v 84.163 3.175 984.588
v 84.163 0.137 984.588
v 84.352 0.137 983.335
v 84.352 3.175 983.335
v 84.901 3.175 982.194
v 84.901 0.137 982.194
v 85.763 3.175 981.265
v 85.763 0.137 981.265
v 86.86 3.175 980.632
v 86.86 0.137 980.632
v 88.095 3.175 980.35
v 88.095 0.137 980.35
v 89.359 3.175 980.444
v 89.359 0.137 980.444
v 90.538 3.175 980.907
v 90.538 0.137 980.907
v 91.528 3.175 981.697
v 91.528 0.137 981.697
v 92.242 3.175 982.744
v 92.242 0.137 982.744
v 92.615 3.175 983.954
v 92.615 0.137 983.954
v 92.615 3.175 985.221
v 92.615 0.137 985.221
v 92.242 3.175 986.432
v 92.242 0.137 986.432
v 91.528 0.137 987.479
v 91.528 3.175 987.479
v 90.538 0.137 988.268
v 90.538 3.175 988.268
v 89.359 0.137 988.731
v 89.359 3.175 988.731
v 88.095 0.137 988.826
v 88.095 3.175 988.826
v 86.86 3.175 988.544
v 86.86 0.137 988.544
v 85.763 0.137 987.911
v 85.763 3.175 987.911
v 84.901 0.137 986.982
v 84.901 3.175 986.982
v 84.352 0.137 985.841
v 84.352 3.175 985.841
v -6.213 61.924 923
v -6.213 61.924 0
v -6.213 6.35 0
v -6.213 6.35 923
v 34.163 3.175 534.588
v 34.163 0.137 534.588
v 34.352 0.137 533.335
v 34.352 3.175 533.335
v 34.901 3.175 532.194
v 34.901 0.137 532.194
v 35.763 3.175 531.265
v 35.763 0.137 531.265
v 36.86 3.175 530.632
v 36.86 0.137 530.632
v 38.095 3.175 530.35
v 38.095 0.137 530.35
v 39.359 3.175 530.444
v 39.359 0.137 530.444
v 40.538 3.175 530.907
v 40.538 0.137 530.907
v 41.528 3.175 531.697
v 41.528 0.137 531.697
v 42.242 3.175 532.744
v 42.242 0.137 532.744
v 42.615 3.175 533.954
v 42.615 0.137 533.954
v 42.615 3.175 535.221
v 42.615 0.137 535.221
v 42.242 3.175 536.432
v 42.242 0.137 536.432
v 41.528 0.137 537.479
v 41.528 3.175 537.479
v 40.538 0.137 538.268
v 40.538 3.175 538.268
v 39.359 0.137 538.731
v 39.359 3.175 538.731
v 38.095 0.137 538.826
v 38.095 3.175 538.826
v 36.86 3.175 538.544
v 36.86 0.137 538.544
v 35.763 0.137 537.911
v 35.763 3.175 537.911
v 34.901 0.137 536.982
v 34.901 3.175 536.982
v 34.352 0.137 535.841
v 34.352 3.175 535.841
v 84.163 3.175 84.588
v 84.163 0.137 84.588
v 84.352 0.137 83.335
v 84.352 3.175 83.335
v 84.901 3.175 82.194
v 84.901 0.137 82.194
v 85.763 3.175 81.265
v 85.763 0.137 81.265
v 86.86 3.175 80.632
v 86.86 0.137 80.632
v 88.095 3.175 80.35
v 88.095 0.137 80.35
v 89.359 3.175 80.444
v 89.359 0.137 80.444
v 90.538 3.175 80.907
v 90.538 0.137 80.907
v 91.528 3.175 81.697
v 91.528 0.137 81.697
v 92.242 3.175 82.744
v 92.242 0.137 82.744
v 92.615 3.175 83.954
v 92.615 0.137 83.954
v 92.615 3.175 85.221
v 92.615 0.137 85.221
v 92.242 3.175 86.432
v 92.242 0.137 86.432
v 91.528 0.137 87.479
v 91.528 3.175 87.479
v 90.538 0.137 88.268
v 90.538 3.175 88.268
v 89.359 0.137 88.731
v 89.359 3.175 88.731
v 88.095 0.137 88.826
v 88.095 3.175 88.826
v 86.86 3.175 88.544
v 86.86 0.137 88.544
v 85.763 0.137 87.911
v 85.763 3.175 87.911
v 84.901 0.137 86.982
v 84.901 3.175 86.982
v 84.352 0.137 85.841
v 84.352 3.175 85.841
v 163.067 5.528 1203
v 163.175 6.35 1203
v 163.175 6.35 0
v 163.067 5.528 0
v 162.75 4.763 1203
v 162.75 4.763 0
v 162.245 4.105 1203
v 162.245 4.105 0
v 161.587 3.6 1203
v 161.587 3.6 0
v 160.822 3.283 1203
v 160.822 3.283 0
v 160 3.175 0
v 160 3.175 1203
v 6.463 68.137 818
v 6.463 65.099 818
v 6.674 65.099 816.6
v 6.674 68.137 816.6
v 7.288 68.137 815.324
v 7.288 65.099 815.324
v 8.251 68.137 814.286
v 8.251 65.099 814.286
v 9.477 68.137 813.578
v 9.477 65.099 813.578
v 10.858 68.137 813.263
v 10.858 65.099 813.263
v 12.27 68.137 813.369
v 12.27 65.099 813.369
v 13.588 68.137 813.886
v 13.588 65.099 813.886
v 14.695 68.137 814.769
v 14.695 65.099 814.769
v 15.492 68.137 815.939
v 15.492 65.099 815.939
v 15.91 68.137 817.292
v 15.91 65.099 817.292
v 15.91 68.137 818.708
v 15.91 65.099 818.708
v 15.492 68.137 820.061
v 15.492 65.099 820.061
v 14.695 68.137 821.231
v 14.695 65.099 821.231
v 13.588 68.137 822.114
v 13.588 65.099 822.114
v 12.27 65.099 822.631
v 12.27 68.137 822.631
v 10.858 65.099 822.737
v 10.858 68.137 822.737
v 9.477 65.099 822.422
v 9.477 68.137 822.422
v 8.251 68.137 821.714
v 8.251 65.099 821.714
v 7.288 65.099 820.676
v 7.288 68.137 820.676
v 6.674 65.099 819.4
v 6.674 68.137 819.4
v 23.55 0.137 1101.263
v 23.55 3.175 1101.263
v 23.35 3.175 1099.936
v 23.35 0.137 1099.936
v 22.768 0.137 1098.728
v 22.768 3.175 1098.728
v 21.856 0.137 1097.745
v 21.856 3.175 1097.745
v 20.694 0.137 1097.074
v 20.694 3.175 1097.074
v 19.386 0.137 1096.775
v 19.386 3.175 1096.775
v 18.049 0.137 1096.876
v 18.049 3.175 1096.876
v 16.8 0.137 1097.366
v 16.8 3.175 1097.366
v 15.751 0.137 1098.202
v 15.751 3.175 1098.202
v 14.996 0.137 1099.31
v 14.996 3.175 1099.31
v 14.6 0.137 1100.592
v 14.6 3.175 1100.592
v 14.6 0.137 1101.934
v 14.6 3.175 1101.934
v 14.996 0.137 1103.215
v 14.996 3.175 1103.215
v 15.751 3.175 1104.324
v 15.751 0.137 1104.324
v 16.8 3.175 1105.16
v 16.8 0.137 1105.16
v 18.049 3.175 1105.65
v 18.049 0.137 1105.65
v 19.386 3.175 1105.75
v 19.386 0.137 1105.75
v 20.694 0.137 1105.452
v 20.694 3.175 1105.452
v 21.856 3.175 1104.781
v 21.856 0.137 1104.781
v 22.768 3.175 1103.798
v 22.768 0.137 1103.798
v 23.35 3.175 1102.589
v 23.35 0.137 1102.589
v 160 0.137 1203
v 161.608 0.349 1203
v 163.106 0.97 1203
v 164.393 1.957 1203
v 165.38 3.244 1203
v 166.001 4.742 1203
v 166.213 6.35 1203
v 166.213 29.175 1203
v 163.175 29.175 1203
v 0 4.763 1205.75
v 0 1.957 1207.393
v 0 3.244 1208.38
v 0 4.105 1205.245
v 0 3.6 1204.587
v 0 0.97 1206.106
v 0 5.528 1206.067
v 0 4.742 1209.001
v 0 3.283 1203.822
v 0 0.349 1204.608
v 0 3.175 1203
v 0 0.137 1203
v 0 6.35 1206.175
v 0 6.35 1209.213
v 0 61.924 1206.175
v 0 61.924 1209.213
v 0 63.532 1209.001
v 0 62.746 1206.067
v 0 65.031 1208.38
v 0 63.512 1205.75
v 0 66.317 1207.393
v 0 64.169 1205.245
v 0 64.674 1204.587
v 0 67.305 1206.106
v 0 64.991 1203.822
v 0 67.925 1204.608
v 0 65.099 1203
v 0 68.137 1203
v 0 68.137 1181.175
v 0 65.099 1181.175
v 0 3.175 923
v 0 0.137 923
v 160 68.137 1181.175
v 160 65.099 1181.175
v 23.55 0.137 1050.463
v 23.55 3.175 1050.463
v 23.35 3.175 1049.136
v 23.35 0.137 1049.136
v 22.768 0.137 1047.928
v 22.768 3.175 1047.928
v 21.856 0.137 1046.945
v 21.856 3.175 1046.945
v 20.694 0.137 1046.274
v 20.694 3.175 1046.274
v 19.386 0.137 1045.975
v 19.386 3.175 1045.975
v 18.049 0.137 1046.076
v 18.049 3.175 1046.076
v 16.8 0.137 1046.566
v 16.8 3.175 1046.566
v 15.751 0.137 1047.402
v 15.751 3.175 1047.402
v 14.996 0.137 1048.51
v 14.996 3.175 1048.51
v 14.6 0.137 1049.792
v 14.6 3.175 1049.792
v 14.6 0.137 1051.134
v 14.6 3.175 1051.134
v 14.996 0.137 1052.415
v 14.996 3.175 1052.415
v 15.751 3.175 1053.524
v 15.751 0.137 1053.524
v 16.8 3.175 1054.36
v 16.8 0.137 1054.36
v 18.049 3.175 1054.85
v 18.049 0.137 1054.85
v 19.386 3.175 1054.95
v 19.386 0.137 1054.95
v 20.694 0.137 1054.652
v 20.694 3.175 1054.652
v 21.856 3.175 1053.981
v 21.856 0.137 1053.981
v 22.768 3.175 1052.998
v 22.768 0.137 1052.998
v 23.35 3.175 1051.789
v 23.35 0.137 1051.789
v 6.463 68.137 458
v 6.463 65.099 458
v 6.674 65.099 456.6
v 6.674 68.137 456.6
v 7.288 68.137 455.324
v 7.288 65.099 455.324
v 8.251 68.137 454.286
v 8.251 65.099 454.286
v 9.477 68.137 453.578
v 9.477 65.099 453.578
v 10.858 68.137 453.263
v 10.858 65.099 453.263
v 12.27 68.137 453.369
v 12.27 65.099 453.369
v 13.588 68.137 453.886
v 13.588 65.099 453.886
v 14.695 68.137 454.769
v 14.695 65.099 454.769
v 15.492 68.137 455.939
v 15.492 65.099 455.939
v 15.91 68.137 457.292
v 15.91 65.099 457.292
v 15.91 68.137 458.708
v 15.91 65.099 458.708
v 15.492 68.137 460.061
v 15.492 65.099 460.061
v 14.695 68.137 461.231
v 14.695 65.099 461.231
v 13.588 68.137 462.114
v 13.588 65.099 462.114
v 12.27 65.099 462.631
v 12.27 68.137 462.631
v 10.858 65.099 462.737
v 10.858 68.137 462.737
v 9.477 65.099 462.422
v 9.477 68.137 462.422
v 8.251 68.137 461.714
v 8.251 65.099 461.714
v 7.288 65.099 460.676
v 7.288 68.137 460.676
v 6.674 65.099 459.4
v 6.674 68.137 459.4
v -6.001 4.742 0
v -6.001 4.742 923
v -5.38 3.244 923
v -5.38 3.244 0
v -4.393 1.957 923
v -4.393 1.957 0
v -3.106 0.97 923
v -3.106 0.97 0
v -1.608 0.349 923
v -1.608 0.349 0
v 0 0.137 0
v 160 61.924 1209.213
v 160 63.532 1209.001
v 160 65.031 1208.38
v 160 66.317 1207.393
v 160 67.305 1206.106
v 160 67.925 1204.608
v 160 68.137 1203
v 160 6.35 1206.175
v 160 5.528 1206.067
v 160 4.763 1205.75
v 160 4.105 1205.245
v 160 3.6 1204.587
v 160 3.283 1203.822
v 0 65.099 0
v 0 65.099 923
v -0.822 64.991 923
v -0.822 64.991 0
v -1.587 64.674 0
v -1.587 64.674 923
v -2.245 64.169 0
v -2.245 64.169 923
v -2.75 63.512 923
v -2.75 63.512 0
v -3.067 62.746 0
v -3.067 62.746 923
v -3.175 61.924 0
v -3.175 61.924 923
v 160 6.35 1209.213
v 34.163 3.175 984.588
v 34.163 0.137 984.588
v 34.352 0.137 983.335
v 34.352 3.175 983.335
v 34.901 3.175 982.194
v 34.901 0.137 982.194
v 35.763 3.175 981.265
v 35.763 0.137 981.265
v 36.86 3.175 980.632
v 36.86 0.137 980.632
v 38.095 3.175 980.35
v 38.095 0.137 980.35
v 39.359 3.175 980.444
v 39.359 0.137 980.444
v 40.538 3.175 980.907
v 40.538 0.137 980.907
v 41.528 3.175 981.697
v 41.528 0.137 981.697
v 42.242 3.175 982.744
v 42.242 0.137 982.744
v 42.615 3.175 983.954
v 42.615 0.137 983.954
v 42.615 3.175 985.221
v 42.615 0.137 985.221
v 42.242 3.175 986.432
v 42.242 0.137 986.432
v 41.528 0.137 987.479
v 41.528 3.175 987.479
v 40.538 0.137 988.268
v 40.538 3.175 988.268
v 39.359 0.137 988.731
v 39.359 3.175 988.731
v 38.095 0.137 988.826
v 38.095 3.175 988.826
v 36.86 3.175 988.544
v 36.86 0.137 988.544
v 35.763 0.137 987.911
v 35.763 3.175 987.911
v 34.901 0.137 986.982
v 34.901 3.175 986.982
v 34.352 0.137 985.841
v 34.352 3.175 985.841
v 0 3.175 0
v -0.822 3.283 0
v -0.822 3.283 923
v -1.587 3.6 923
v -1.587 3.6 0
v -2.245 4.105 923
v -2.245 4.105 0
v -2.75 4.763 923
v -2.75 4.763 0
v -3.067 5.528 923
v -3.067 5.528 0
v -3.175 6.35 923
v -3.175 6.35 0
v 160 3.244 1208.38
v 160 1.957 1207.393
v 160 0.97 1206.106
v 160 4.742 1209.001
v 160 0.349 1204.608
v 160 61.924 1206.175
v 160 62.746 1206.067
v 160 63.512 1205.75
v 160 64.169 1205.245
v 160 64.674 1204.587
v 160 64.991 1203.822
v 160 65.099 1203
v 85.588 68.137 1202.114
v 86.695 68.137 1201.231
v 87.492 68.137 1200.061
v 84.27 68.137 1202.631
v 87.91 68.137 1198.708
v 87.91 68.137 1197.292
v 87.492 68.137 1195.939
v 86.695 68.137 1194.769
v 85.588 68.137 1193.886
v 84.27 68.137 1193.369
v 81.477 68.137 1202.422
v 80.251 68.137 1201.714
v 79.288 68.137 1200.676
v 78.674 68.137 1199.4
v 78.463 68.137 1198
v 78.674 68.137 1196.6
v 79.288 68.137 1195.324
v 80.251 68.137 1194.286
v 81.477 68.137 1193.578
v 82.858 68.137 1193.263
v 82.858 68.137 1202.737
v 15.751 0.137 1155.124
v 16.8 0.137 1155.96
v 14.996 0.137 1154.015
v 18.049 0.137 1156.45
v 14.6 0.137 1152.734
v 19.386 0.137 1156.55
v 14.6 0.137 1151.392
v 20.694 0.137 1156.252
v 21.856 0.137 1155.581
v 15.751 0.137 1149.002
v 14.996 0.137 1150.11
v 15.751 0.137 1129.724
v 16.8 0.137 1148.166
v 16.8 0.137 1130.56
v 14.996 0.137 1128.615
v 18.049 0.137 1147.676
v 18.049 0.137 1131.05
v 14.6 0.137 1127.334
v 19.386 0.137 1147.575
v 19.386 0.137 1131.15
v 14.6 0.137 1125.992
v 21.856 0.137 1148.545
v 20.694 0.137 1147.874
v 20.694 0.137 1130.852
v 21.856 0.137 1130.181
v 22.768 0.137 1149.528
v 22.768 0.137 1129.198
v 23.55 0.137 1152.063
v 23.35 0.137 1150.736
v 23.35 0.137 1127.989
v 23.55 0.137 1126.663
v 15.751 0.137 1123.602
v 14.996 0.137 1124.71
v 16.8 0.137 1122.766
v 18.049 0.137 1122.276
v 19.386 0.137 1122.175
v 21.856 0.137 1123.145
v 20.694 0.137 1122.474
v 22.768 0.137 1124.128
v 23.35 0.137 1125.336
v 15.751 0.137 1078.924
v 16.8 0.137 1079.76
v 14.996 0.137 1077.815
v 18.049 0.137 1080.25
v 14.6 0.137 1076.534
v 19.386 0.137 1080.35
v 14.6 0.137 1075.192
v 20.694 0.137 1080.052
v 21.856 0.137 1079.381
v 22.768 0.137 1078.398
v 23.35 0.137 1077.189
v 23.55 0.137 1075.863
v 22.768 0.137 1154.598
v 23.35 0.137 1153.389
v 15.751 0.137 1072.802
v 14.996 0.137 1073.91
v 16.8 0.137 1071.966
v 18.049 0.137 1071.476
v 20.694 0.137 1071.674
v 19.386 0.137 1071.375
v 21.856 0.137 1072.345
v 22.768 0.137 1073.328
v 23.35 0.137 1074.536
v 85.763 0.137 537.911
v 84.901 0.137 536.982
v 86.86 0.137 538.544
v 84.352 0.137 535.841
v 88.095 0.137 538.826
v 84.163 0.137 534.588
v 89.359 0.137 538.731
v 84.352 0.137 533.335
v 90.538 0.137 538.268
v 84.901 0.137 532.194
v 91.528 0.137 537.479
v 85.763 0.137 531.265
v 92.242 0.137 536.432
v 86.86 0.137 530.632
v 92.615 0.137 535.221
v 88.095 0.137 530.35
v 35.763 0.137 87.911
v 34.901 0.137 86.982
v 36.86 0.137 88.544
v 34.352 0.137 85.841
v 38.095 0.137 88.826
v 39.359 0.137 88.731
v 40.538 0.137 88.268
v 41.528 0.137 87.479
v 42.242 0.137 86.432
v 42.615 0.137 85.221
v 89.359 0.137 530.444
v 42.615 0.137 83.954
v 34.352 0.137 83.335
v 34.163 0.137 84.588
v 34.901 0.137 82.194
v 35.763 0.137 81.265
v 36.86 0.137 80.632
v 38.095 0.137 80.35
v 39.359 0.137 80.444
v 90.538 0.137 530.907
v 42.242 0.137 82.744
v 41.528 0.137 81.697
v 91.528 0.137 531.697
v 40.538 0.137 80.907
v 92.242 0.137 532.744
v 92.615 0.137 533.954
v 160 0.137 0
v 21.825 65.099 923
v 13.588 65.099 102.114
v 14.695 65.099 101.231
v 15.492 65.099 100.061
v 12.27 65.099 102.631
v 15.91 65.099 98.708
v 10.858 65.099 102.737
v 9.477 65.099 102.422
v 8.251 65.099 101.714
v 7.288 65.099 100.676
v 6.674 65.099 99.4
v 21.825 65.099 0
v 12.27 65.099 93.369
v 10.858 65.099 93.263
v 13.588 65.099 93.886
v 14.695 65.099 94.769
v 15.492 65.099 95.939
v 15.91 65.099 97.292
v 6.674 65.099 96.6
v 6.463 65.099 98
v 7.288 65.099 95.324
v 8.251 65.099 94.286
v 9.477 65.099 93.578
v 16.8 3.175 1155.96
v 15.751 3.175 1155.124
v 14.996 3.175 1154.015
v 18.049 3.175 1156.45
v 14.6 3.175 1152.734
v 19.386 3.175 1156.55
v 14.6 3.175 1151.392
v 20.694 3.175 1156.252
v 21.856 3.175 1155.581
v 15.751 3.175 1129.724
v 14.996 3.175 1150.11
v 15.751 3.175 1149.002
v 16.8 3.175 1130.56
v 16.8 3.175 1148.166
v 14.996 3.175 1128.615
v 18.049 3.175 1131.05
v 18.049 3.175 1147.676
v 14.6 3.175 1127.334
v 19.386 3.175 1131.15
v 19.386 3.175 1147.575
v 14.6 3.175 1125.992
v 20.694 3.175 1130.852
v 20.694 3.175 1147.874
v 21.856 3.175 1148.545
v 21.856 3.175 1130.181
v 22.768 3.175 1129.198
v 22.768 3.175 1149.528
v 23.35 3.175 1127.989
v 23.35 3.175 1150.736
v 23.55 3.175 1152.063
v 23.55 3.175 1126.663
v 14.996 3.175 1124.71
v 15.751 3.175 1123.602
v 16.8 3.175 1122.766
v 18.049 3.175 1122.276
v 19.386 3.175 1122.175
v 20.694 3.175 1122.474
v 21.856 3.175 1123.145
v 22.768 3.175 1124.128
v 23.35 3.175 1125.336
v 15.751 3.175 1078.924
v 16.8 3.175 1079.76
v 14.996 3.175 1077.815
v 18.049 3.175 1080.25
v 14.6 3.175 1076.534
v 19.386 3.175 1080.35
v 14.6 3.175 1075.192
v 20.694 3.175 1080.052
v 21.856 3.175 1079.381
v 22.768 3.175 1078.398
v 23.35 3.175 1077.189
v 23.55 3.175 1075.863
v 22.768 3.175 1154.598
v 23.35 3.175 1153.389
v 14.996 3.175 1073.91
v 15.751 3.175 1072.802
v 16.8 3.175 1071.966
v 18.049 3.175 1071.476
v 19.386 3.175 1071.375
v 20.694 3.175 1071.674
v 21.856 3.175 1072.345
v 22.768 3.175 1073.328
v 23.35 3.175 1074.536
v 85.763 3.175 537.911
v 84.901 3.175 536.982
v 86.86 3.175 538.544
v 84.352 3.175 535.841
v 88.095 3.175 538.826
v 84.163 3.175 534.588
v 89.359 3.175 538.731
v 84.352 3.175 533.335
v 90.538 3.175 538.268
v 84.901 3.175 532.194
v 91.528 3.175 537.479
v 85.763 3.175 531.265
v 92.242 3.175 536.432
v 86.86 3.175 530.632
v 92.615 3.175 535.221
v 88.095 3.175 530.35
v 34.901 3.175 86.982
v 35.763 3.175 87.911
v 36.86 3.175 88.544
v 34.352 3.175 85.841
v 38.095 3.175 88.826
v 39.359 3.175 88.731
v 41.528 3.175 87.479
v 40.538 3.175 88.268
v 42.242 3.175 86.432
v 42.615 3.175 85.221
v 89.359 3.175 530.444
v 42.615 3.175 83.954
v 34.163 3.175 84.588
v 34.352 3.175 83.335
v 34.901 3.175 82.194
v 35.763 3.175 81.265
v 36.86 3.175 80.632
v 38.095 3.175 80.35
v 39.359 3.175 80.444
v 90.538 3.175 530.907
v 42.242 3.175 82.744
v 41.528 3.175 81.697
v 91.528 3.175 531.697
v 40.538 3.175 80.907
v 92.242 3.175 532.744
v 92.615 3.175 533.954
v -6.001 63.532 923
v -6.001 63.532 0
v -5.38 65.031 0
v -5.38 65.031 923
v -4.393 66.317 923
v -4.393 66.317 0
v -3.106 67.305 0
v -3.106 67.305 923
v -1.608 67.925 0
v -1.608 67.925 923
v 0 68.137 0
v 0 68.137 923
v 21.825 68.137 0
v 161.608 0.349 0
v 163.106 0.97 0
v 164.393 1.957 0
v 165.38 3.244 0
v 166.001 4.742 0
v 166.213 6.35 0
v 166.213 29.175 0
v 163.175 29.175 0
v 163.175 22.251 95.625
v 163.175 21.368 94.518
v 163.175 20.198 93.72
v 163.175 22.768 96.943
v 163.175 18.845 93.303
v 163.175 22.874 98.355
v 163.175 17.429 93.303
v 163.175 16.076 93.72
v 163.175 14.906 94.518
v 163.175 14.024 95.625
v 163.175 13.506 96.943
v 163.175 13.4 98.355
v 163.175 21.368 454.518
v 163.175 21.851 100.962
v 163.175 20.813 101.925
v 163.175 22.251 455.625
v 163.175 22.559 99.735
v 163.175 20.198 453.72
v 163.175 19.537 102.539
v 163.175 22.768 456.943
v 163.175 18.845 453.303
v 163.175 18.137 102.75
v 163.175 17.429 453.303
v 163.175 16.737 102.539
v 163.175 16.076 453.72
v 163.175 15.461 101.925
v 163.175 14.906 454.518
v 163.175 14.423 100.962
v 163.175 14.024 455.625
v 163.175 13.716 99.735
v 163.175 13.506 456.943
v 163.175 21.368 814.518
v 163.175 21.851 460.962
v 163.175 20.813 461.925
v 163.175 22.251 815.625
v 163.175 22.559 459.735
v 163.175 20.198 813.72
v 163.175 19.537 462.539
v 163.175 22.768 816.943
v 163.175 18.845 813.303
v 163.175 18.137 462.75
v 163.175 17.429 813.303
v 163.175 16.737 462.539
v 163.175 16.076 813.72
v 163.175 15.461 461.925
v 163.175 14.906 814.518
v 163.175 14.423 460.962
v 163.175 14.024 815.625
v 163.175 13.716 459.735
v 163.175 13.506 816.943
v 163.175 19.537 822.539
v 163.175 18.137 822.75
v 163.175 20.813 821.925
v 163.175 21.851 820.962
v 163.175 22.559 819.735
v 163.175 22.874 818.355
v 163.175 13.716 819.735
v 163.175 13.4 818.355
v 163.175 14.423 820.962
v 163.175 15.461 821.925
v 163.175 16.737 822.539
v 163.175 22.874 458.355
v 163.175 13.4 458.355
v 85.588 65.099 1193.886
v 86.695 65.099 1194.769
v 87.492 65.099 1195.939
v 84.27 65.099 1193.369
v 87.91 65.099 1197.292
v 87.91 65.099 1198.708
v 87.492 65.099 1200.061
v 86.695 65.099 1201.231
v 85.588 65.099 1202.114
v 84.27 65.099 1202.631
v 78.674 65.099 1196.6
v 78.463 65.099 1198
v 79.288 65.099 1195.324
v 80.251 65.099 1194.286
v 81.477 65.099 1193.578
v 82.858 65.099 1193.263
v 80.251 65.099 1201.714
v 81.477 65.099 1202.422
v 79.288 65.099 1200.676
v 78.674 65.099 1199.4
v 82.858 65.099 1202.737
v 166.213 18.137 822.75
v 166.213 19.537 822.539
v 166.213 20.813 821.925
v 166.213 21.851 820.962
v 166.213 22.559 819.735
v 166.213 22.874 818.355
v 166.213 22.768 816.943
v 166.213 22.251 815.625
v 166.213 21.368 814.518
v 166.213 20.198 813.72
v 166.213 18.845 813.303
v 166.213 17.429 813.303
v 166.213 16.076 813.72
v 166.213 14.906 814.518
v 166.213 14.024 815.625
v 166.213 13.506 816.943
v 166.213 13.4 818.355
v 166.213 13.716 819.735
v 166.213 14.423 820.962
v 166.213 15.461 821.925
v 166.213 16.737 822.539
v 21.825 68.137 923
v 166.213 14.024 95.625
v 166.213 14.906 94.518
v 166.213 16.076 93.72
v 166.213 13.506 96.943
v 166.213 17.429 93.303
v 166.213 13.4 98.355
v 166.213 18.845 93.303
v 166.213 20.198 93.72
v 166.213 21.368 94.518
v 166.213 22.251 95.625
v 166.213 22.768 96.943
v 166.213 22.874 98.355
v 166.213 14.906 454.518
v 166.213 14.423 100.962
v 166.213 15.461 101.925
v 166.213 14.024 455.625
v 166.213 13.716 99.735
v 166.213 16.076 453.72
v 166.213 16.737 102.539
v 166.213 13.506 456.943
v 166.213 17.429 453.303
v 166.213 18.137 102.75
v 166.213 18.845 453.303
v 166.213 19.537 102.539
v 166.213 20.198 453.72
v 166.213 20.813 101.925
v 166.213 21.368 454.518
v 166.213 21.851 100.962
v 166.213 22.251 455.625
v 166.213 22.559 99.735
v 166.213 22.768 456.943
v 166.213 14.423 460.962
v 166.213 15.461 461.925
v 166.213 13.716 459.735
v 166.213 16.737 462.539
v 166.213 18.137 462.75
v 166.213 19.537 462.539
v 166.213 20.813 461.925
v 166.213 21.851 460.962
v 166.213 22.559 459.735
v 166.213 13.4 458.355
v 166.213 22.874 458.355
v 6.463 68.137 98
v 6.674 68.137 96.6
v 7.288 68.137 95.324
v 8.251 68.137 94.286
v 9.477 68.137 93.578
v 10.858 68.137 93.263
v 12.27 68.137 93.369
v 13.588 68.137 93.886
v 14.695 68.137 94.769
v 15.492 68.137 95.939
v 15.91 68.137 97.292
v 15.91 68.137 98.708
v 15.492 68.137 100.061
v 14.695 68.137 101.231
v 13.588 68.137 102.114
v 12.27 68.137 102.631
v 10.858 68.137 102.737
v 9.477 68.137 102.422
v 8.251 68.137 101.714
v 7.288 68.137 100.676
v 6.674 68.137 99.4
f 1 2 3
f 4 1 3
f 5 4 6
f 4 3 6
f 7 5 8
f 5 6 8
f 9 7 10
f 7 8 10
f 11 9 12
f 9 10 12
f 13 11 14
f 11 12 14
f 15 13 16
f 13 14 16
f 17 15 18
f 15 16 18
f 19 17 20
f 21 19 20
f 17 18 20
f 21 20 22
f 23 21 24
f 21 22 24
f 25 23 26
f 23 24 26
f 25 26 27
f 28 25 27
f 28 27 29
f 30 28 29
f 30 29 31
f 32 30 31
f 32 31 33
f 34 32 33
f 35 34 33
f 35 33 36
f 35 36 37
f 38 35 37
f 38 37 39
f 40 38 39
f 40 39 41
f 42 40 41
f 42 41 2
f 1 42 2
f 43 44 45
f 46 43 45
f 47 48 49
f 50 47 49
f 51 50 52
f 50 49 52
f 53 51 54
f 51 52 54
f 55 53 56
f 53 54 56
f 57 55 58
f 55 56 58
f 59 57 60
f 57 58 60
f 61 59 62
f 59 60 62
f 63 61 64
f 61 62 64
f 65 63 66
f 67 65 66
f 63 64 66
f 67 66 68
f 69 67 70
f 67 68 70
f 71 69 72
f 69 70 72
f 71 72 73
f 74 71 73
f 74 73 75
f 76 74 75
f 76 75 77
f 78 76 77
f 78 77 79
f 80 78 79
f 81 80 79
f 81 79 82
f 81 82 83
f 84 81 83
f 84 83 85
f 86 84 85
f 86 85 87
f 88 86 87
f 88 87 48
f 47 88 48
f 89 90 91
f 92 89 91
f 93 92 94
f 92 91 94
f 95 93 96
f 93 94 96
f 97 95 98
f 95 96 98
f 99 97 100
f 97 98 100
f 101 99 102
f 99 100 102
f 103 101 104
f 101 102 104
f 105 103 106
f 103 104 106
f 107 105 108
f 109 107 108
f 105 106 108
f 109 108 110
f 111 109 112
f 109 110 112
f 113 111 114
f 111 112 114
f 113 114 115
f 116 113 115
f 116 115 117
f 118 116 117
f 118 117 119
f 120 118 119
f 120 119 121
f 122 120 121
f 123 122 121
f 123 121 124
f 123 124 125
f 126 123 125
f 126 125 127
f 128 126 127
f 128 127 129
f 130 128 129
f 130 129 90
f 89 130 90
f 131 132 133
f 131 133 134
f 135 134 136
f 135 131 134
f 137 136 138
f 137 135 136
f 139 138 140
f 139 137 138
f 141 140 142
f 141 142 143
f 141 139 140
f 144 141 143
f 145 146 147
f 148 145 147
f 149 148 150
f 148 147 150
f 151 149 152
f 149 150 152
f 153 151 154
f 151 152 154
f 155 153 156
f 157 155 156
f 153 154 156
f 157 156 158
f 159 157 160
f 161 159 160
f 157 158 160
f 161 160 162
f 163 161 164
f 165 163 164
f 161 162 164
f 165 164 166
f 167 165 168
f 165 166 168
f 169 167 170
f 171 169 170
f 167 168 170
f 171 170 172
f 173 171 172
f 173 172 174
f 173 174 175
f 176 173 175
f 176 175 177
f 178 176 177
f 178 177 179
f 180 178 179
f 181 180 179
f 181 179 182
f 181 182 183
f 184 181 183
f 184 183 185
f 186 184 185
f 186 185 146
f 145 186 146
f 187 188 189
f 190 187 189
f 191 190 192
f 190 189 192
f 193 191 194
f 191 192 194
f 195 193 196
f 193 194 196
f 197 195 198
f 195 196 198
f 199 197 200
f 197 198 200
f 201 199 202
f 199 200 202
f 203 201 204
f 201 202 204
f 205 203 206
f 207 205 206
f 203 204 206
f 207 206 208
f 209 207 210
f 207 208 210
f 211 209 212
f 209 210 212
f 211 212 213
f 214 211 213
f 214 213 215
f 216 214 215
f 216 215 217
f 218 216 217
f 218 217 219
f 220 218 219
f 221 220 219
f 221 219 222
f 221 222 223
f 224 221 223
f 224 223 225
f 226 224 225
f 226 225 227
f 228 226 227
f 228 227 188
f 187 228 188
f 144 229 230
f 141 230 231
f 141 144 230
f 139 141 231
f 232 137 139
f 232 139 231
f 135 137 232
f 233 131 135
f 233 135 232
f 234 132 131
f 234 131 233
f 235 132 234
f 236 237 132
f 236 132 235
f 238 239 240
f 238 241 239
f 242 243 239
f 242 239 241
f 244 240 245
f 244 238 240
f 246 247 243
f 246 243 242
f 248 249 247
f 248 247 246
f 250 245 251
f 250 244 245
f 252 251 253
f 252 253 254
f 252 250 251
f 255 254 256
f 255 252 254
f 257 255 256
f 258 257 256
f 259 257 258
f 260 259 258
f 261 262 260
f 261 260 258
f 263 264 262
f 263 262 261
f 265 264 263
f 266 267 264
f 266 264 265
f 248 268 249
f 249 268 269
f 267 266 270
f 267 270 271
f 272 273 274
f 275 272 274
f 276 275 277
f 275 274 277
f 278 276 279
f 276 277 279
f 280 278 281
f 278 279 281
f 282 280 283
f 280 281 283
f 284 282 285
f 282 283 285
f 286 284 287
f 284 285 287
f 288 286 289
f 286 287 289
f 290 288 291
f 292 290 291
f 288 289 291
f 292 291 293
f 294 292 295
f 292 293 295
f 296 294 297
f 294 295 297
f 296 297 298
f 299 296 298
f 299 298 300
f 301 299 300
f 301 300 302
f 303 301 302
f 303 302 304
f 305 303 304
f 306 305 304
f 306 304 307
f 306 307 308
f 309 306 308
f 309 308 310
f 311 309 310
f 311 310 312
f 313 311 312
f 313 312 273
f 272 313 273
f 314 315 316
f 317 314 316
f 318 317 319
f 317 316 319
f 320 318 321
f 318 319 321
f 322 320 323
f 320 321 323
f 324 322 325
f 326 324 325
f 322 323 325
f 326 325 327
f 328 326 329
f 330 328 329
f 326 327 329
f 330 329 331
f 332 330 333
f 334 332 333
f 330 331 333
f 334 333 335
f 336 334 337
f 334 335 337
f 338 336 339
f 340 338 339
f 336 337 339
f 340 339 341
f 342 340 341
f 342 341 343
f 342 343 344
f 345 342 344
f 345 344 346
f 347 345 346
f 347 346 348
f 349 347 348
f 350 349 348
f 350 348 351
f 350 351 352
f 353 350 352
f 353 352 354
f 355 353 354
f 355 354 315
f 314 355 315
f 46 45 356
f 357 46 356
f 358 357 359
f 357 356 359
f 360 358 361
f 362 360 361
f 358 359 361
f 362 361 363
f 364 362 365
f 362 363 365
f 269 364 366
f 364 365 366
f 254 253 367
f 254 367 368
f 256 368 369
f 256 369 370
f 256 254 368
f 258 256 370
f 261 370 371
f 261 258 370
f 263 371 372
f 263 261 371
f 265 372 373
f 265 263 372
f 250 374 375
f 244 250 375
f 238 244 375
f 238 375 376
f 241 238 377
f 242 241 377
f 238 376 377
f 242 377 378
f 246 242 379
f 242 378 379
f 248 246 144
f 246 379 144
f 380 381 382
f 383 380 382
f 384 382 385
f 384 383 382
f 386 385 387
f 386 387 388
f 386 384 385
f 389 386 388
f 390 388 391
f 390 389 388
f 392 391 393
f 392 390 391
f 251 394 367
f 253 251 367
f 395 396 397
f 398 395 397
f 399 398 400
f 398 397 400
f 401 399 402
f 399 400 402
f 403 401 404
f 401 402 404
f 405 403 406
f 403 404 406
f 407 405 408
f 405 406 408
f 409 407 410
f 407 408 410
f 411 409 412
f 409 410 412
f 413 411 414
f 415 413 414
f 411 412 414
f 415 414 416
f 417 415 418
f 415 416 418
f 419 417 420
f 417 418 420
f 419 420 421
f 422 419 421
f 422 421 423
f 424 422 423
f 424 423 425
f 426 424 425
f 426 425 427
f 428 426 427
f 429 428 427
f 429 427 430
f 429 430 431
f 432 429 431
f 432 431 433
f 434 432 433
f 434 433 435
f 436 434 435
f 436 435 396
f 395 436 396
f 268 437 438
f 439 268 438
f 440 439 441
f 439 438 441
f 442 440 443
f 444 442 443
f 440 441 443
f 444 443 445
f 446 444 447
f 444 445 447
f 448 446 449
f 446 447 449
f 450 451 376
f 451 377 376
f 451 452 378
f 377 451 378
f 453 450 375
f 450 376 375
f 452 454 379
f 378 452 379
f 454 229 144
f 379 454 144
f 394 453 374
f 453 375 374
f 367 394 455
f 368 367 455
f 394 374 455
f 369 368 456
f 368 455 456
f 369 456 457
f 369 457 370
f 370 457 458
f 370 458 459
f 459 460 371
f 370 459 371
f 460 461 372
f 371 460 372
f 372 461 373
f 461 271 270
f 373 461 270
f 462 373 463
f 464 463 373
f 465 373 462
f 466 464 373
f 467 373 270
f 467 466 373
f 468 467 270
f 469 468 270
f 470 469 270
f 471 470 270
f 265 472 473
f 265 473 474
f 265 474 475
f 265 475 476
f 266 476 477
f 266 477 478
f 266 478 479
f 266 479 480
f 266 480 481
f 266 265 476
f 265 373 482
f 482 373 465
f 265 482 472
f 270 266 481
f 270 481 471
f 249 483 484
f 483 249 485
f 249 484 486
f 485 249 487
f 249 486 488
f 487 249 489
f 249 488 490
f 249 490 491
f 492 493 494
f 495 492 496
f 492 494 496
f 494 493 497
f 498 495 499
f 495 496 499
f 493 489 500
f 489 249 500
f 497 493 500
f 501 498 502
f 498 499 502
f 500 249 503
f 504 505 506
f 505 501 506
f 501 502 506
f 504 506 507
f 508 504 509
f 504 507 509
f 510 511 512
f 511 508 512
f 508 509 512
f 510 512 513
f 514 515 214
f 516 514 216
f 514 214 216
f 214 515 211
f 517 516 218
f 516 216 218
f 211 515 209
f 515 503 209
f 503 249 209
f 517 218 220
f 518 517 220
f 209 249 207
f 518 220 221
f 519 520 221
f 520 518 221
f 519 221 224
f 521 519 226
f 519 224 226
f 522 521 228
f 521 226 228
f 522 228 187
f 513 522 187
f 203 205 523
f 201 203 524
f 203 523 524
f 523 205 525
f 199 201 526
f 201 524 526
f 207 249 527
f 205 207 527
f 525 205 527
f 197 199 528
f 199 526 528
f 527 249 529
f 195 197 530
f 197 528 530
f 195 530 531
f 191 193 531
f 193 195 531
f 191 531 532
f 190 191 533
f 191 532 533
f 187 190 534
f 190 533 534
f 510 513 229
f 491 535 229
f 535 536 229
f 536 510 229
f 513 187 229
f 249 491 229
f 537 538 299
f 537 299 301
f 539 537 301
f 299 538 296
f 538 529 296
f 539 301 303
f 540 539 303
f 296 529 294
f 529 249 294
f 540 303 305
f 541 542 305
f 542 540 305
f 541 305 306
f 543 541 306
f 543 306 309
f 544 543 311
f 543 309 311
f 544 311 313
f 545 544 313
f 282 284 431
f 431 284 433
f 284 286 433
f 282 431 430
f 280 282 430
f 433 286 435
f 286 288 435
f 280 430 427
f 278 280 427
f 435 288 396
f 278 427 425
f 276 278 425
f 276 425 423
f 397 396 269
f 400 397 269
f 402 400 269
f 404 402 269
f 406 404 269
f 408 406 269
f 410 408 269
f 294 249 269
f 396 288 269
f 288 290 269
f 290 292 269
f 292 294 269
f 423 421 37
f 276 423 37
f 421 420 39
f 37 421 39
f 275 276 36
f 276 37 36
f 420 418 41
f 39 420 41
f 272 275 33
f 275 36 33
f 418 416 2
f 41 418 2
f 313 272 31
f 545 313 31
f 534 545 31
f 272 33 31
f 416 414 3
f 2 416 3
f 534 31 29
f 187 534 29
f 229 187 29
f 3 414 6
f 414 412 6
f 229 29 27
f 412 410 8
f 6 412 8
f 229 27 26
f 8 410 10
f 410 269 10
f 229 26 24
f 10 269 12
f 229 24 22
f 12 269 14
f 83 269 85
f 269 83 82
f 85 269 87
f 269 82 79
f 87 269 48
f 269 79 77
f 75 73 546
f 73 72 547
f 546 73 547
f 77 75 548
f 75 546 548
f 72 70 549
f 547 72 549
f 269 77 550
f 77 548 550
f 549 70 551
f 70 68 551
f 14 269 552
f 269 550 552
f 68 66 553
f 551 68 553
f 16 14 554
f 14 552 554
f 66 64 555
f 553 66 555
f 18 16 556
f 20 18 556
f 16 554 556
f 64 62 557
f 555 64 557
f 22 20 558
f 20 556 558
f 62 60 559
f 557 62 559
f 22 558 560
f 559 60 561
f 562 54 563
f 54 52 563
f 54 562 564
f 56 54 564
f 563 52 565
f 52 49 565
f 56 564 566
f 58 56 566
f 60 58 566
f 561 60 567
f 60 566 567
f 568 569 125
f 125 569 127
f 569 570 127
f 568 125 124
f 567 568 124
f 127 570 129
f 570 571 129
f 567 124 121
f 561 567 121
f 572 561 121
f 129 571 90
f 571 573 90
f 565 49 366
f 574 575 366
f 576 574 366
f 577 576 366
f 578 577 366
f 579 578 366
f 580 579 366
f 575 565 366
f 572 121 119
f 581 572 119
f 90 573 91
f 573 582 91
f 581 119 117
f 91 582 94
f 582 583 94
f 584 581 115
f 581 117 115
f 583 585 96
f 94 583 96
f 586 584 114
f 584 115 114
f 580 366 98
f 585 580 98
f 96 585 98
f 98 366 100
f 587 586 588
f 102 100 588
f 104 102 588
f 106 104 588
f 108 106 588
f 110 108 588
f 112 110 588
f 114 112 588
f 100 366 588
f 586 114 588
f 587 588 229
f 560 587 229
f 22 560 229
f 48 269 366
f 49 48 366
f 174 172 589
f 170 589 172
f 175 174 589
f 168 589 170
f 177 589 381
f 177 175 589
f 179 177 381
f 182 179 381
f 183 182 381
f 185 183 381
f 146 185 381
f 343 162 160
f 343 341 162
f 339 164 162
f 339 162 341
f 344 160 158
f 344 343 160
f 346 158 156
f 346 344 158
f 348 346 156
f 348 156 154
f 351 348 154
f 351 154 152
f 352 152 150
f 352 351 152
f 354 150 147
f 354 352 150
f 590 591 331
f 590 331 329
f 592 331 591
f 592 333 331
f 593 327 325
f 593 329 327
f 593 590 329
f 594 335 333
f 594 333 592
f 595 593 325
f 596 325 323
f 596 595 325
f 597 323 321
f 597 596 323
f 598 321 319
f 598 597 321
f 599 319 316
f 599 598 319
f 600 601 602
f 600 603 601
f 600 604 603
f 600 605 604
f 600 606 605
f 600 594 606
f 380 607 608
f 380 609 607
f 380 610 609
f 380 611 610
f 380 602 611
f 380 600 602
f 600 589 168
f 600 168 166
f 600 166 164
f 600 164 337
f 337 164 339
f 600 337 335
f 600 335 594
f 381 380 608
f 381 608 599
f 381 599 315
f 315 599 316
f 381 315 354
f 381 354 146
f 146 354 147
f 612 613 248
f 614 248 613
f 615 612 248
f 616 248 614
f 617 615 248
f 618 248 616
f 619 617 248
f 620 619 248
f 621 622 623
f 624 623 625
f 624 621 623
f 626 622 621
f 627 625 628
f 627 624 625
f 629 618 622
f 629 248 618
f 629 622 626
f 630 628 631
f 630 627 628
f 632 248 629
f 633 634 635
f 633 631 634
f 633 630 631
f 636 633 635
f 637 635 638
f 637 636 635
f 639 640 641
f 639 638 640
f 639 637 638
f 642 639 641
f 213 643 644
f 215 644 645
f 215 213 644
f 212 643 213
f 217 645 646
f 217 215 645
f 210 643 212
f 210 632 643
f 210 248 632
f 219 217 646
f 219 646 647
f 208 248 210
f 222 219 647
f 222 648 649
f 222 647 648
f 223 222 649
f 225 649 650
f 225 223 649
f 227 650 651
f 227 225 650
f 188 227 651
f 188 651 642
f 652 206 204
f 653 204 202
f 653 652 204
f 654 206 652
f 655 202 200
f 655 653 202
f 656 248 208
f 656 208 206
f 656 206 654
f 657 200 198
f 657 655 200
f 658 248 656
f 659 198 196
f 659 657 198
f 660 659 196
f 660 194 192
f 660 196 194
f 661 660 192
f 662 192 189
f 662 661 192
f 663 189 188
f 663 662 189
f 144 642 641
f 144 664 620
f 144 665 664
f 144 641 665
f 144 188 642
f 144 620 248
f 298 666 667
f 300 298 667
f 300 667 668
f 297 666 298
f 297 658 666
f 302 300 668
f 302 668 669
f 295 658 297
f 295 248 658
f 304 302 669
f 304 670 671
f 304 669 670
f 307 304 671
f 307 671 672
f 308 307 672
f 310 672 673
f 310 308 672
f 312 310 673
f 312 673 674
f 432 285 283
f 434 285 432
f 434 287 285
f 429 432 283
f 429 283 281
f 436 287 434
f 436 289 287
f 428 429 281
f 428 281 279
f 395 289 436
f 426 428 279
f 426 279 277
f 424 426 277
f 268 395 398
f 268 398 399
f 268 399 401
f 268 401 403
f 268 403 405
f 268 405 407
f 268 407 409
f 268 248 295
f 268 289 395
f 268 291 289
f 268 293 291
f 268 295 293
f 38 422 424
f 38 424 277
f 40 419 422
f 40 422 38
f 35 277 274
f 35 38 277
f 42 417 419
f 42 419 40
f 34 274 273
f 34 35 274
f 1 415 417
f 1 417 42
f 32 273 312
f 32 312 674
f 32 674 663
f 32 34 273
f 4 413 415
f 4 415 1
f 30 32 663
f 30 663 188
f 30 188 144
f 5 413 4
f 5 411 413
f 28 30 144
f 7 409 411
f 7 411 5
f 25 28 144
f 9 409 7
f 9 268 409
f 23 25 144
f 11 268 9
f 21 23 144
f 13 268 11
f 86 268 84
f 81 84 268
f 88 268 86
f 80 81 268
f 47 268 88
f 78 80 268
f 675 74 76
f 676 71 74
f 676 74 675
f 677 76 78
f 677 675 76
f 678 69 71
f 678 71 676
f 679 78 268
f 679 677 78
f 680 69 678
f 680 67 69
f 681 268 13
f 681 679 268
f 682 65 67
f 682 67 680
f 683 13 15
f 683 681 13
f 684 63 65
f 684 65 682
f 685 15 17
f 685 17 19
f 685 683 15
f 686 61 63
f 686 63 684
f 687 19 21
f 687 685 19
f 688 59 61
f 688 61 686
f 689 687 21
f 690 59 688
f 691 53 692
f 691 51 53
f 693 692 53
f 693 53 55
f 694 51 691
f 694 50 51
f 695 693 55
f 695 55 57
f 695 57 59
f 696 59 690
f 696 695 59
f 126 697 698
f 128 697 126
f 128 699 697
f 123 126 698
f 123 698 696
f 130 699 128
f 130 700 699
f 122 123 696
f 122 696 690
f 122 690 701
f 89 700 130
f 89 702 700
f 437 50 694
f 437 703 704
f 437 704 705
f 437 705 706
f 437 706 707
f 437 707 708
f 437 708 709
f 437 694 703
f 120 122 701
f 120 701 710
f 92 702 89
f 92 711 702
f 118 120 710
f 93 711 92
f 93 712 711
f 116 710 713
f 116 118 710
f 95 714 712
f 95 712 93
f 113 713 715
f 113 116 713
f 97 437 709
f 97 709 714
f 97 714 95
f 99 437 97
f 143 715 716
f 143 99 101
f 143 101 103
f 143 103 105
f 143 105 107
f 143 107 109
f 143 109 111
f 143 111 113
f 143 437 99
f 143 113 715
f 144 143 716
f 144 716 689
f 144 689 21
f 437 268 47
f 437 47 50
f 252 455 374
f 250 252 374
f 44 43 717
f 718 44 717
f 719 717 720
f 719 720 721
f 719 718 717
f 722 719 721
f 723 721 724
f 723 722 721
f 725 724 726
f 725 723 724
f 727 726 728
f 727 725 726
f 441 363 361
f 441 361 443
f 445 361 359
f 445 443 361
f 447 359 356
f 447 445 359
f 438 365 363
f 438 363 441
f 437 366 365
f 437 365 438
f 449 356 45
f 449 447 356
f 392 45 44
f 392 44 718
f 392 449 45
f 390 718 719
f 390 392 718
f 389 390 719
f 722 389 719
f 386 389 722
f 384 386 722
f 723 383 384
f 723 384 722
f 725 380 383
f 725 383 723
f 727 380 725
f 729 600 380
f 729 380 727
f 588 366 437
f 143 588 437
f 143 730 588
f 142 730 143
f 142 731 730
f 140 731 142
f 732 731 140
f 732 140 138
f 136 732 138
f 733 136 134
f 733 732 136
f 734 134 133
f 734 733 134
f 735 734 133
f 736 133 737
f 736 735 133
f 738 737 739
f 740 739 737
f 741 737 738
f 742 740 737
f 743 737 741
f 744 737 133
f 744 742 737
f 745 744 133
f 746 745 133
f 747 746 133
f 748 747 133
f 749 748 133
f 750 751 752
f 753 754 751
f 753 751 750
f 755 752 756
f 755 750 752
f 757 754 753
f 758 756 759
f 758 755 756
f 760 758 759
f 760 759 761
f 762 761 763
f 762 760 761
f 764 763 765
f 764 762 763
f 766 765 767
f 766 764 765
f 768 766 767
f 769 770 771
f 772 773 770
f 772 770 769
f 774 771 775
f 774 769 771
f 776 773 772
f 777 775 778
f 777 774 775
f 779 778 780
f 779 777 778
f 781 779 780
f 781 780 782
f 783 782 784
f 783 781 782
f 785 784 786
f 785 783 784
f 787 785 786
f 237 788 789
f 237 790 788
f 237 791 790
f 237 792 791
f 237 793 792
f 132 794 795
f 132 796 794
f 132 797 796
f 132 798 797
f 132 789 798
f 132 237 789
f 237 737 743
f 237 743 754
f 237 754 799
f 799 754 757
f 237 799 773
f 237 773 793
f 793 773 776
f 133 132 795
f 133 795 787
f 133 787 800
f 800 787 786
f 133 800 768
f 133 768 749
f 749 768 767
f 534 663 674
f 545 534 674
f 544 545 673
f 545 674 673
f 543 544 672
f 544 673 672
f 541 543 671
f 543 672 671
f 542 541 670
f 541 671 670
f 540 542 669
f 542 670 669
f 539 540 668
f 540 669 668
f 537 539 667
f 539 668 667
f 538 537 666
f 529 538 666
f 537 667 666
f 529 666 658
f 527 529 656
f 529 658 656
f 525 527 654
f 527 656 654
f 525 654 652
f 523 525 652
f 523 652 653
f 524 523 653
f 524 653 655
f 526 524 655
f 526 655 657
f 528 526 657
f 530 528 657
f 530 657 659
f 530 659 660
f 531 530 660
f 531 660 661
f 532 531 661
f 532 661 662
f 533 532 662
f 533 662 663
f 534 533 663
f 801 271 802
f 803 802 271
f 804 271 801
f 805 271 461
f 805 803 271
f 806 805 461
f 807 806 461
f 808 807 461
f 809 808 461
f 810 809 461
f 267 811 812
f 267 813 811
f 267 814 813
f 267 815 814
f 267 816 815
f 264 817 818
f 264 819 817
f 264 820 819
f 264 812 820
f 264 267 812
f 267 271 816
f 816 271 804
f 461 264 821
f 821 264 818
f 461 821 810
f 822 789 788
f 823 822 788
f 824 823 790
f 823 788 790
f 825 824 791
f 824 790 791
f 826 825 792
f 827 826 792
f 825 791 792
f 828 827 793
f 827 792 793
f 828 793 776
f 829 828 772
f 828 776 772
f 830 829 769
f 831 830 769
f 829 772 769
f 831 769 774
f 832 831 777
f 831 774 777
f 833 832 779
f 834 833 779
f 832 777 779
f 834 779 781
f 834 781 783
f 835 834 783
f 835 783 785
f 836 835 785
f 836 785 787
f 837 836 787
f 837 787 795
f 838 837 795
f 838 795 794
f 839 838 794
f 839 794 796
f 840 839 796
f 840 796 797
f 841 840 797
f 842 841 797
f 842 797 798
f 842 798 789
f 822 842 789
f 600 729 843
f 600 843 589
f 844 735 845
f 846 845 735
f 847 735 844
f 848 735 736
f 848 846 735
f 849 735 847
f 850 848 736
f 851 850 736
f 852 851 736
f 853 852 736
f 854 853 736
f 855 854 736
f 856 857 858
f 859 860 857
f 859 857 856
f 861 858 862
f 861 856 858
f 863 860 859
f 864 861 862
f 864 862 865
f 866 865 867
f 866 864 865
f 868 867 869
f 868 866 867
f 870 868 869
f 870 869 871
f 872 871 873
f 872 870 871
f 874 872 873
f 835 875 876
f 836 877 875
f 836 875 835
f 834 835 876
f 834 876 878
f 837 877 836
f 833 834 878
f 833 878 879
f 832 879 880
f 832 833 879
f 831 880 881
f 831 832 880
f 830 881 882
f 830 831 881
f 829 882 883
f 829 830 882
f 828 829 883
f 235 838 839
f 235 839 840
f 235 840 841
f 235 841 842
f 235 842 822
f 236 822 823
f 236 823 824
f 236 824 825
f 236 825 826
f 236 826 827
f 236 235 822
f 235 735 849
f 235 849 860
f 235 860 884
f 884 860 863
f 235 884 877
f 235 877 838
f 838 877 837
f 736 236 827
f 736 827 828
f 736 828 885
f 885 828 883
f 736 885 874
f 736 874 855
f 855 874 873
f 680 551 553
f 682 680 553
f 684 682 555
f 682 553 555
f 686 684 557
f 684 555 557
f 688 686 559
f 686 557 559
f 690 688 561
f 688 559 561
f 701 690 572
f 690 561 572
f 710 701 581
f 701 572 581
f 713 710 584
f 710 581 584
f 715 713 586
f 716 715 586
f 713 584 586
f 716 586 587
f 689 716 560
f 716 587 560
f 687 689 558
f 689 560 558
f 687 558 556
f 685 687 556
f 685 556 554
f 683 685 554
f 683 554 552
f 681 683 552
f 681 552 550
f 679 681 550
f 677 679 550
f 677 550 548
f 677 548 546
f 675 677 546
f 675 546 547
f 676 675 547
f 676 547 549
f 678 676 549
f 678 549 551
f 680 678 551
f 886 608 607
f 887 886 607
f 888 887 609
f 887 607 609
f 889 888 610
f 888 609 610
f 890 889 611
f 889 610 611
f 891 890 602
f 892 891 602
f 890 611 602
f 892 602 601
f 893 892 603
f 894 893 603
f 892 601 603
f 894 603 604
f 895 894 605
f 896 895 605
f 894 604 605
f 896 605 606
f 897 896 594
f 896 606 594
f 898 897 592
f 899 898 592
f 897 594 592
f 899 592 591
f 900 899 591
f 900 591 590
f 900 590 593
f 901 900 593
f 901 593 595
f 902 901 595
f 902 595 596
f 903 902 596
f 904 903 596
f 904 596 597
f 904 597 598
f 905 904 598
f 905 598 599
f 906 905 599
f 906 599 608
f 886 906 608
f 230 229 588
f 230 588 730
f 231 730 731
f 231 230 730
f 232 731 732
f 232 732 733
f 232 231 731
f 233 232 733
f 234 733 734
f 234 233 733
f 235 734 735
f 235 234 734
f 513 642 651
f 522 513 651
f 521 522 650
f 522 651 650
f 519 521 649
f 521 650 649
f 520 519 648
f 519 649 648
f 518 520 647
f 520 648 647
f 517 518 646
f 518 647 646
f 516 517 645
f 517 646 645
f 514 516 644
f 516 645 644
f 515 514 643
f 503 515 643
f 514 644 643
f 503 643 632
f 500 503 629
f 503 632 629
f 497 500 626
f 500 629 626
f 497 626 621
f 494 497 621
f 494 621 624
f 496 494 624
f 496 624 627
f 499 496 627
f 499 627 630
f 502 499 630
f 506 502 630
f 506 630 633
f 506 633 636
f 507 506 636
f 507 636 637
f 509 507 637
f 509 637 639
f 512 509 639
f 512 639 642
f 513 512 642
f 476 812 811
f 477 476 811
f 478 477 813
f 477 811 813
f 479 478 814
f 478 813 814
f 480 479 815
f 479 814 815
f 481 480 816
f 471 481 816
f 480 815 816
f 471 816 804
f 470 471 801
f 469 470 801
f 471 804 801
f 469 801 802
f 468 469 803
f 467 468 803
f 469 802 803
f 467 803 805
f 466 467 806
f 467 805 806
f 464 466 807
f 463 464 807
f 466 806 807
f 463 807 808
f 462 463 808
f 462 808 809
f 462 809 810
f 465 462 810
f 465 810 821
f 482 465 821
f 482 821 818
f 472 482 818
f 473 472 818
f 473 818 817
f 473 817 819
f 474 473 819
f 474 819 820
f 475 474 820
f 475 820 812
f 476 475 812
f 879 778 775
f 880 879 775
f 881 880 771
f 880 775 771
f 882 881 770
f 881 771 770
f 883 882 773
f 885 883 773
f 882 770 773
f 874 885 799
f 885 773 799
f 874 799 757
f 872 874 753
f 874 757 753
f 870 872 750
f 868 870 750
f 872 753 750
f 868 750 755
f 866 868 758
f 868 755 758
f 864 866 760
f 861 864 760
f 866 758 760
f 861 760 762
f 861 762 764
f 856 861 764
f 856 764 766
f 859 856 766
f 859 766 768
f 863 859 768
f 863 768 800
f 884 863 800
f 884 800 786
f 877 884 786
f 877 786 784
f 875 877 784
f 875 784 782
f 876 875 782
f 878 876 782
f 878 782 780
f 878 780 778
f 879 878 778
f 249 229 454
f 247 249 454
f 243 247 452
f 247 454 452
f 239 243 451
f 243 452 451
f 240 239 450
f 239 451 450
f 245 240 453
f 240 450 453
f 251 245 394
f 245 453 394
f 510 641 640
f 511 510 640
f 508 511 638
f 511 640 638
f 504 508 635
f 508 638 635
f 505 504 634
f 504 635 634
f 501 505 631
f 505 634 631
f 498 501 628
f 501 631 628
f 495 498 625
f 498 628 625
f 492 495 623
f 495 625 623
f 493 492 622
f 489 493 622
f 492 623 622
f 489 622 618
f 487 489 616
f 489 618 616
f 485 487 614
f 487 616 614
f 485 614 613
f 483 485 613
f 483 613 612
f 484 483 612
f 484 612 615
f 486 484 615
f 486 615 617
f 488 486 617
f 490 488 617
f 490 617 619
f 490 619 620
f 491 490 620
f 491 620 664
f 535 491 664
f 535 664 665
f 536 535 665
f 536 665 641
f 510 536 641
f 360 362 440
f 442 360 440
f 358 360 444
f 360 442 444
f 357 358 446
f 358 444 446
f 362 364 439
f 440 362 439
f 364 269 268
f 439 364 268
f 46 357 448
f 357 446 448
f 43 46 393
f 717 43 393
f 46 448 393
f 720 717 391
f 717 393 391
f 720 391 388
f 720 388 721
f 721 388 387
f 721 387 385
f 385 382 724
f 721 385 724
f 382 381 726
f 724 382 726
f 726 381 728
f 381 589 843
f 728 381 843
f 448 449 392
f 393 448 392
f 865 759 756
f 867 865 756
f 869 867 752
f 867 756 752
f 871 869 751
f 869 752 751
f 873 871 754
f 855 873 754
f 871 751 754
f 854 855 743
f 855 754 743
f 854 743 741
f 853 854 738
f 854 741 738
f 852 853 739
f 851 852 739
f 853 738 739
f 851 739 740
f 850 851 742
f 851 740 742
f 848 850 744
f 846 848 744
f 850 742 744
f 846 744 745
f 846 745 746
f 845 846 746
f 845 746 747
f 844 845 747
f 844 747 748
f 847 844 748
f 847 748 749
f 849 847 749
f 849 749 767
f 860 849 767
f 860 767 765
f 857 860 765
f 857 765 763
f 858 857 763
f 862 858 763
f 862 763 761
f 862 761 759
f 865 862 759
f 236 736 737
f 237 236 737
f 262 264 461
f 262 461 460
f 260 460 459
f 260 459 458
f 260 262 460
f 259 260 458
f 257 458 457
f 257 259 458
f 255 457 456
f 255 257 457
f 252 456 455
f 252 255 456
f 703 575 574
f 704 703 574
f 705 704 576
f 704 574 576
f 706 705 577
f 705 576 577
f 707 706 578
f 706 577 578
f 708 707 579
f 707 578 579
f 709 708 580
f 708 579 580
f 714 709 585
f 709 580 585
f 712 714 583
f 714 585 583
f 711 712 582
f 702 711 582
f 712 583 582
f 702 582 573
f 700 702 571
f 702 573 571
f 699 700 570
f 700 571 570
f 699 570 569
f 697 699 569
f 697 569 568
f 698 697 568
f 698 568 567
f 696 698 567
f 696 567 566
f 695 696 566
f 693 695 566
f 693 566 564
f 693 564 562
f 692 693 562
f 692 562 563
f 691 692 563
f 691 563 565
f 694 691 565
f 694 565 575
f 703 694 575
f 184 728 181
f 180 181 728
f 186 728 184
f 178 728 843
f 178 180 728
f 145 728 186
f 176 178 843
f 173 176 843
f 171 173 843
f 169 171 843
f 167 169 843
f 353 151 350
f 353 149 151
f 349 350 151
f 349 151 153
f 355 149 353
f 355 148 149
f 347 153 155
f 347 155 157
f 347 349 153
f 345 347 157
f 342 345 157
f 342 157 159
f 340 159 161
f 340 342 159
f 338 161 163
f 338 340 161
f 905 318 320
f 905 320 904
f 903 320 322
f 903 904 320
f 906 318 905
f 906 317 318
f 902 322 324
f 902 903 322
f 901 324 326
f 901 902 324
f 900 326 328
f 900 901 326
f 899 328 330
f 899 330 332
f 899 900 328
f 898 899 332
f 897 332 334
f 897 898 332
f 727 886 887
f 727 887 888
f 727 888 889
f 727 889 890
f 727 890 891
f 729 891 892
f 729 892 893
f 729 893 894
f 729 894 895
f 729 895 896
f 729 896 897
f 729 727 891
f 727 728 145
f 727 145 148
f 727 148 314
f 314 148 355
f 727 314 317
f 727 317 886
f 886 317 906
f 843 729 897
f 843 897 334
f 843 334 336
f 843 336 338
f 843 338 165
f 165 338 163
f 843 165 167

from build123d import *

# Parameters (mm, degrees)
SKETCH1_W                      = 160
SKETCH1_H                      = 1203
BOSS_EXTRUDE1_DEPTH            = 3.175
CONVERT_SOLID1_OUTLINE_W       = 160
CONVERT_SOLID1_OUTLINE_H       = 1203
CONVERT_SOLID1_DEPTH           = 0.13716
EDGE_FLANGE1_DEPTH             = 1203
EDGE_FLANGE2_START             = -160
EDGE_FLANGE2_DEPTH             = 160
EDGE_FLANGE2_2_DEPTH           = 923
EDGE_FLANGE3_DEPTH             = 923
EDGE_FLANGE3_BEND_DEPTH        = 160
F_9_5_9_5_DIAMETER_HOLE9_D     = 9.5
F_9_5_9_5_DIAMETER_HOLE9_DEPTH = 3.03784
F_9_5_9_5_DIAMETER_HOLE8_D     = 9.5
F_9_5_9_5_DIAMETER_HOLE8_DEPTH = 3.03784
M6_CLEARANCE_HOLE1_D           = 8.5
M8_CLEARANCE_HOLE1_D           = 9


# Read off the part's stored shape, not the designer's step: Convert-Solid1, Edge-Flange2
# Sheet-metal steps are written as plain solids
with BuildPart() as part:
    # Sketch1 → Boss-Extrude1 (new body)
    with BuildSketch(Plane(origin=(0, 0, 0), x_dir=(1, 0, 0), z_dir=(0, 1, 0))):
        with Locations((80, -601.5)):
            Rectangle(SKETCH1_W, SKETCH1_H)
    extrude(amount=BOSS_EXTRUDE1_DEPTH)

    # Convert-Solid1 outline → Convert-Solid1 (cut)
    with BuildSketch(Plane(origin=(0, 0, 0), x_dir=(1, 0, 0), z_dir=(0, 1, 0))):
        with Locations((80, -601.5)):
            Rectangle(CONVERT_SOLID1_OUTLINE_W, CONVERT_SOLID1_OUTLINE_H)
    extrude(amount=CONVERT_SOLID1_DEPTH, mode=Mode.SUBTRACT)

    # Edge-Flange1 section (across the edge) → Edge-Flange1 (add)
    with BuildSketch(Plane(origin=(163.175, 3.175, 1203), x_dir=(-1, 0, 0), z_dir=(0, 0, -1))):
        with BuildLine():
            Line((-3.03784, 3.175), (-3.03784, 26))
            Line((-3.03784, 26), (0, 26))
            Line((0, 26), (0, 3.175))
            ThreePointArc((0, 3.175), (0.92993597, 0.92993597), (3.175, 0))
            Line((3.175, 0), (3.175, -3.03784))
            ThreePointArc((3.175, -3.03784), (-1.218141294, -1.218141294), (-3.03784, 3.175))
        make_face()
    extrude(amount=EDGE_FLANGE1_DEPTH)

    # Edge-Flange2 outline → Edge-Flange2 (add)
    with BuildSketch(Plane(origin=(0, 3.175, 0), x_dir=(0, 0, 1), z_dir=(-1, 0, 0)).offset(EDGE_FLANGE2_START)):
        with BuildLine():
            Line((1209.21284, 58.74932), (1206.175, 58.74932))
            Line((1206.175, 58.74932), (1206.175, 3.175))
            ThreePointArc((1206.175, 3.175), (1205.24506403, 0.92993597), (1203, 0))
            Line((1203, 0), (1203, -3.03784))
            ThreePointArc((1203, -3.03784), (1207.393141294, -1.218141294), (1209.21284, 3.175))
            Line((1209.21284, 3.175), (1209.21284, 58.74932))
        make_face()
    extrude(amount=EDGE_FLANGE2_DEPTH)

    # Edge-Flange2 2 outline → Edge-Flange2 2 (add)
    with BuildSketch(Plane.XY):
        with BuildLine():
            Line((-6.21284, 61.92432), (-6.21284, 6.35))
            ThreePointArc((-6.21284, 6.35), (-4.393141294, 1.956858706), (0, 0.13716))
            Line((0, 0.13716), (0, 3.175))
            ThreePointArc((0, 3.175), (-2.24506403, 4.10493597), (-3.175, 6.35))
            Line((-3.175, 6.35), (-3.175, 61.92432))
            Line((-3.175, 61.92432), (-6.21284, 61.92432))
        make_face()
    extrude(amount=EDGE_FLANGE2_2_DEPTH)

    # Edge-Flange3 section (across the edge) → Edge-Flange3 (add)
    with BuildSketch(Plane(origin=(-3.175, 65.09932, 0), x_dir=(0, -1, 0), z_dir=(0, 0, 1))):
        with BuildLine():
            Line((-3.03784, 3.175), (-3.03784, 25))
            Line((-3.03784, 25), (0, 25))
            Line((0, 25), (0, 3.175))
            ThreePointArc((0, 3.175), (0.92993597, 0.92993597), (3.175, 0))
            Line((3.175, 0), (3.175, -3.03784))
            ThreePointArc((3.175, -3.03784), (-1.218141294, -1.218141294), (-3.03784, 3.175))
        make_face()
    extrude(amount=EDGE_FLANGE3_DEPTH)

    # Edge-Flange3 section 2 (across the edge) → Edge-Flange3 bend (add)
    with BuildSketch(Plane(origin=(0, 65.09932, 1206.175), x_dir=(0, -1, 0), z_dir=(1, 0, 0))):
        with BuildLine():
            Line((-3.03784, 3.175), (-3.03784, 25))
            Line((-3.03784, 25), (0, 25))
            Line((0, 25), (0, 3.175))
            ThreePointArc((0, 3.175), (0.92993597, 0.92993597), (3.175, 0))
            Line((3.175, 0), (3.175, -3.03784))
            ThreePointArc((3.175, -3.03784), (-1.218141294, -1.218141294), (-3.03784, 3.175))
        make_face()
    extrude(amount=EDGE_FLANGE3_BEND_DEPTH)

    # Ø9.5 (9.5) Diameter Hole9
    with Locations(Plane(origin=(166.21284, 0, 0), x_dir=(0, 0, -1), z_dir=(1, 0, 0))):
        with Locations((-98, 18.13716), (-458, 18.13716), (-818, 18.13716)):
            Hole(F_9_5_9_5_DIAMETER_HOLE9_D / 2, depth=F_9_5_9_5_DIAMETER_HOLE9_DEPTH)

    # Ø9.5 (9.5) Diameter Hole8
    with Locations(Plane(origin=(0, 68.13716, 0), x_dir=(1, 0, 0), z_dir=(0, 1, 0))):
        with Locations((11.21284, -98), (11.21284, -458), (11.21284, -818), (83.21284, -1198)):
            Hole(F_9_5_9_5_DIAMETER_HOLE8_D / 2, depth=F_9_5_9_5_DIAMETER_HOLE8_DEPTH)

    # M6 Clearance Hole1 (through all)
    with Locations(Plane(origin=(0, 3.175, 0), x_dir=(1, 0, 0), z_dir=(0, 1, 0))):
        with Locations((38.41286, -84.5878), (88.41286, -84.5878), (88.41286, -534.5878), (38.41286, -534.5878), (38.41286, -984.5878), (88.41286, -984.5878)):
            Hole(M6_CLEARANCE_HOLE1_D / 2)

    # M8 Clearance Hole1 (through all)
    with Locations(Plane(origin=(0, 0.13716, 0), x_dir=(-1, 0, 0), z_dir=(0, -1, 0))):
        with Locations((-19.05, -1152.06284), (-19.05, -1126.66284), (-19.05, -1101.26284), (-19.05, -1075.86284), (-19.05, -1050.46284)):
            Hole(M8_CLEARANCE_HOLE1_D / 2)


solid = part.part
